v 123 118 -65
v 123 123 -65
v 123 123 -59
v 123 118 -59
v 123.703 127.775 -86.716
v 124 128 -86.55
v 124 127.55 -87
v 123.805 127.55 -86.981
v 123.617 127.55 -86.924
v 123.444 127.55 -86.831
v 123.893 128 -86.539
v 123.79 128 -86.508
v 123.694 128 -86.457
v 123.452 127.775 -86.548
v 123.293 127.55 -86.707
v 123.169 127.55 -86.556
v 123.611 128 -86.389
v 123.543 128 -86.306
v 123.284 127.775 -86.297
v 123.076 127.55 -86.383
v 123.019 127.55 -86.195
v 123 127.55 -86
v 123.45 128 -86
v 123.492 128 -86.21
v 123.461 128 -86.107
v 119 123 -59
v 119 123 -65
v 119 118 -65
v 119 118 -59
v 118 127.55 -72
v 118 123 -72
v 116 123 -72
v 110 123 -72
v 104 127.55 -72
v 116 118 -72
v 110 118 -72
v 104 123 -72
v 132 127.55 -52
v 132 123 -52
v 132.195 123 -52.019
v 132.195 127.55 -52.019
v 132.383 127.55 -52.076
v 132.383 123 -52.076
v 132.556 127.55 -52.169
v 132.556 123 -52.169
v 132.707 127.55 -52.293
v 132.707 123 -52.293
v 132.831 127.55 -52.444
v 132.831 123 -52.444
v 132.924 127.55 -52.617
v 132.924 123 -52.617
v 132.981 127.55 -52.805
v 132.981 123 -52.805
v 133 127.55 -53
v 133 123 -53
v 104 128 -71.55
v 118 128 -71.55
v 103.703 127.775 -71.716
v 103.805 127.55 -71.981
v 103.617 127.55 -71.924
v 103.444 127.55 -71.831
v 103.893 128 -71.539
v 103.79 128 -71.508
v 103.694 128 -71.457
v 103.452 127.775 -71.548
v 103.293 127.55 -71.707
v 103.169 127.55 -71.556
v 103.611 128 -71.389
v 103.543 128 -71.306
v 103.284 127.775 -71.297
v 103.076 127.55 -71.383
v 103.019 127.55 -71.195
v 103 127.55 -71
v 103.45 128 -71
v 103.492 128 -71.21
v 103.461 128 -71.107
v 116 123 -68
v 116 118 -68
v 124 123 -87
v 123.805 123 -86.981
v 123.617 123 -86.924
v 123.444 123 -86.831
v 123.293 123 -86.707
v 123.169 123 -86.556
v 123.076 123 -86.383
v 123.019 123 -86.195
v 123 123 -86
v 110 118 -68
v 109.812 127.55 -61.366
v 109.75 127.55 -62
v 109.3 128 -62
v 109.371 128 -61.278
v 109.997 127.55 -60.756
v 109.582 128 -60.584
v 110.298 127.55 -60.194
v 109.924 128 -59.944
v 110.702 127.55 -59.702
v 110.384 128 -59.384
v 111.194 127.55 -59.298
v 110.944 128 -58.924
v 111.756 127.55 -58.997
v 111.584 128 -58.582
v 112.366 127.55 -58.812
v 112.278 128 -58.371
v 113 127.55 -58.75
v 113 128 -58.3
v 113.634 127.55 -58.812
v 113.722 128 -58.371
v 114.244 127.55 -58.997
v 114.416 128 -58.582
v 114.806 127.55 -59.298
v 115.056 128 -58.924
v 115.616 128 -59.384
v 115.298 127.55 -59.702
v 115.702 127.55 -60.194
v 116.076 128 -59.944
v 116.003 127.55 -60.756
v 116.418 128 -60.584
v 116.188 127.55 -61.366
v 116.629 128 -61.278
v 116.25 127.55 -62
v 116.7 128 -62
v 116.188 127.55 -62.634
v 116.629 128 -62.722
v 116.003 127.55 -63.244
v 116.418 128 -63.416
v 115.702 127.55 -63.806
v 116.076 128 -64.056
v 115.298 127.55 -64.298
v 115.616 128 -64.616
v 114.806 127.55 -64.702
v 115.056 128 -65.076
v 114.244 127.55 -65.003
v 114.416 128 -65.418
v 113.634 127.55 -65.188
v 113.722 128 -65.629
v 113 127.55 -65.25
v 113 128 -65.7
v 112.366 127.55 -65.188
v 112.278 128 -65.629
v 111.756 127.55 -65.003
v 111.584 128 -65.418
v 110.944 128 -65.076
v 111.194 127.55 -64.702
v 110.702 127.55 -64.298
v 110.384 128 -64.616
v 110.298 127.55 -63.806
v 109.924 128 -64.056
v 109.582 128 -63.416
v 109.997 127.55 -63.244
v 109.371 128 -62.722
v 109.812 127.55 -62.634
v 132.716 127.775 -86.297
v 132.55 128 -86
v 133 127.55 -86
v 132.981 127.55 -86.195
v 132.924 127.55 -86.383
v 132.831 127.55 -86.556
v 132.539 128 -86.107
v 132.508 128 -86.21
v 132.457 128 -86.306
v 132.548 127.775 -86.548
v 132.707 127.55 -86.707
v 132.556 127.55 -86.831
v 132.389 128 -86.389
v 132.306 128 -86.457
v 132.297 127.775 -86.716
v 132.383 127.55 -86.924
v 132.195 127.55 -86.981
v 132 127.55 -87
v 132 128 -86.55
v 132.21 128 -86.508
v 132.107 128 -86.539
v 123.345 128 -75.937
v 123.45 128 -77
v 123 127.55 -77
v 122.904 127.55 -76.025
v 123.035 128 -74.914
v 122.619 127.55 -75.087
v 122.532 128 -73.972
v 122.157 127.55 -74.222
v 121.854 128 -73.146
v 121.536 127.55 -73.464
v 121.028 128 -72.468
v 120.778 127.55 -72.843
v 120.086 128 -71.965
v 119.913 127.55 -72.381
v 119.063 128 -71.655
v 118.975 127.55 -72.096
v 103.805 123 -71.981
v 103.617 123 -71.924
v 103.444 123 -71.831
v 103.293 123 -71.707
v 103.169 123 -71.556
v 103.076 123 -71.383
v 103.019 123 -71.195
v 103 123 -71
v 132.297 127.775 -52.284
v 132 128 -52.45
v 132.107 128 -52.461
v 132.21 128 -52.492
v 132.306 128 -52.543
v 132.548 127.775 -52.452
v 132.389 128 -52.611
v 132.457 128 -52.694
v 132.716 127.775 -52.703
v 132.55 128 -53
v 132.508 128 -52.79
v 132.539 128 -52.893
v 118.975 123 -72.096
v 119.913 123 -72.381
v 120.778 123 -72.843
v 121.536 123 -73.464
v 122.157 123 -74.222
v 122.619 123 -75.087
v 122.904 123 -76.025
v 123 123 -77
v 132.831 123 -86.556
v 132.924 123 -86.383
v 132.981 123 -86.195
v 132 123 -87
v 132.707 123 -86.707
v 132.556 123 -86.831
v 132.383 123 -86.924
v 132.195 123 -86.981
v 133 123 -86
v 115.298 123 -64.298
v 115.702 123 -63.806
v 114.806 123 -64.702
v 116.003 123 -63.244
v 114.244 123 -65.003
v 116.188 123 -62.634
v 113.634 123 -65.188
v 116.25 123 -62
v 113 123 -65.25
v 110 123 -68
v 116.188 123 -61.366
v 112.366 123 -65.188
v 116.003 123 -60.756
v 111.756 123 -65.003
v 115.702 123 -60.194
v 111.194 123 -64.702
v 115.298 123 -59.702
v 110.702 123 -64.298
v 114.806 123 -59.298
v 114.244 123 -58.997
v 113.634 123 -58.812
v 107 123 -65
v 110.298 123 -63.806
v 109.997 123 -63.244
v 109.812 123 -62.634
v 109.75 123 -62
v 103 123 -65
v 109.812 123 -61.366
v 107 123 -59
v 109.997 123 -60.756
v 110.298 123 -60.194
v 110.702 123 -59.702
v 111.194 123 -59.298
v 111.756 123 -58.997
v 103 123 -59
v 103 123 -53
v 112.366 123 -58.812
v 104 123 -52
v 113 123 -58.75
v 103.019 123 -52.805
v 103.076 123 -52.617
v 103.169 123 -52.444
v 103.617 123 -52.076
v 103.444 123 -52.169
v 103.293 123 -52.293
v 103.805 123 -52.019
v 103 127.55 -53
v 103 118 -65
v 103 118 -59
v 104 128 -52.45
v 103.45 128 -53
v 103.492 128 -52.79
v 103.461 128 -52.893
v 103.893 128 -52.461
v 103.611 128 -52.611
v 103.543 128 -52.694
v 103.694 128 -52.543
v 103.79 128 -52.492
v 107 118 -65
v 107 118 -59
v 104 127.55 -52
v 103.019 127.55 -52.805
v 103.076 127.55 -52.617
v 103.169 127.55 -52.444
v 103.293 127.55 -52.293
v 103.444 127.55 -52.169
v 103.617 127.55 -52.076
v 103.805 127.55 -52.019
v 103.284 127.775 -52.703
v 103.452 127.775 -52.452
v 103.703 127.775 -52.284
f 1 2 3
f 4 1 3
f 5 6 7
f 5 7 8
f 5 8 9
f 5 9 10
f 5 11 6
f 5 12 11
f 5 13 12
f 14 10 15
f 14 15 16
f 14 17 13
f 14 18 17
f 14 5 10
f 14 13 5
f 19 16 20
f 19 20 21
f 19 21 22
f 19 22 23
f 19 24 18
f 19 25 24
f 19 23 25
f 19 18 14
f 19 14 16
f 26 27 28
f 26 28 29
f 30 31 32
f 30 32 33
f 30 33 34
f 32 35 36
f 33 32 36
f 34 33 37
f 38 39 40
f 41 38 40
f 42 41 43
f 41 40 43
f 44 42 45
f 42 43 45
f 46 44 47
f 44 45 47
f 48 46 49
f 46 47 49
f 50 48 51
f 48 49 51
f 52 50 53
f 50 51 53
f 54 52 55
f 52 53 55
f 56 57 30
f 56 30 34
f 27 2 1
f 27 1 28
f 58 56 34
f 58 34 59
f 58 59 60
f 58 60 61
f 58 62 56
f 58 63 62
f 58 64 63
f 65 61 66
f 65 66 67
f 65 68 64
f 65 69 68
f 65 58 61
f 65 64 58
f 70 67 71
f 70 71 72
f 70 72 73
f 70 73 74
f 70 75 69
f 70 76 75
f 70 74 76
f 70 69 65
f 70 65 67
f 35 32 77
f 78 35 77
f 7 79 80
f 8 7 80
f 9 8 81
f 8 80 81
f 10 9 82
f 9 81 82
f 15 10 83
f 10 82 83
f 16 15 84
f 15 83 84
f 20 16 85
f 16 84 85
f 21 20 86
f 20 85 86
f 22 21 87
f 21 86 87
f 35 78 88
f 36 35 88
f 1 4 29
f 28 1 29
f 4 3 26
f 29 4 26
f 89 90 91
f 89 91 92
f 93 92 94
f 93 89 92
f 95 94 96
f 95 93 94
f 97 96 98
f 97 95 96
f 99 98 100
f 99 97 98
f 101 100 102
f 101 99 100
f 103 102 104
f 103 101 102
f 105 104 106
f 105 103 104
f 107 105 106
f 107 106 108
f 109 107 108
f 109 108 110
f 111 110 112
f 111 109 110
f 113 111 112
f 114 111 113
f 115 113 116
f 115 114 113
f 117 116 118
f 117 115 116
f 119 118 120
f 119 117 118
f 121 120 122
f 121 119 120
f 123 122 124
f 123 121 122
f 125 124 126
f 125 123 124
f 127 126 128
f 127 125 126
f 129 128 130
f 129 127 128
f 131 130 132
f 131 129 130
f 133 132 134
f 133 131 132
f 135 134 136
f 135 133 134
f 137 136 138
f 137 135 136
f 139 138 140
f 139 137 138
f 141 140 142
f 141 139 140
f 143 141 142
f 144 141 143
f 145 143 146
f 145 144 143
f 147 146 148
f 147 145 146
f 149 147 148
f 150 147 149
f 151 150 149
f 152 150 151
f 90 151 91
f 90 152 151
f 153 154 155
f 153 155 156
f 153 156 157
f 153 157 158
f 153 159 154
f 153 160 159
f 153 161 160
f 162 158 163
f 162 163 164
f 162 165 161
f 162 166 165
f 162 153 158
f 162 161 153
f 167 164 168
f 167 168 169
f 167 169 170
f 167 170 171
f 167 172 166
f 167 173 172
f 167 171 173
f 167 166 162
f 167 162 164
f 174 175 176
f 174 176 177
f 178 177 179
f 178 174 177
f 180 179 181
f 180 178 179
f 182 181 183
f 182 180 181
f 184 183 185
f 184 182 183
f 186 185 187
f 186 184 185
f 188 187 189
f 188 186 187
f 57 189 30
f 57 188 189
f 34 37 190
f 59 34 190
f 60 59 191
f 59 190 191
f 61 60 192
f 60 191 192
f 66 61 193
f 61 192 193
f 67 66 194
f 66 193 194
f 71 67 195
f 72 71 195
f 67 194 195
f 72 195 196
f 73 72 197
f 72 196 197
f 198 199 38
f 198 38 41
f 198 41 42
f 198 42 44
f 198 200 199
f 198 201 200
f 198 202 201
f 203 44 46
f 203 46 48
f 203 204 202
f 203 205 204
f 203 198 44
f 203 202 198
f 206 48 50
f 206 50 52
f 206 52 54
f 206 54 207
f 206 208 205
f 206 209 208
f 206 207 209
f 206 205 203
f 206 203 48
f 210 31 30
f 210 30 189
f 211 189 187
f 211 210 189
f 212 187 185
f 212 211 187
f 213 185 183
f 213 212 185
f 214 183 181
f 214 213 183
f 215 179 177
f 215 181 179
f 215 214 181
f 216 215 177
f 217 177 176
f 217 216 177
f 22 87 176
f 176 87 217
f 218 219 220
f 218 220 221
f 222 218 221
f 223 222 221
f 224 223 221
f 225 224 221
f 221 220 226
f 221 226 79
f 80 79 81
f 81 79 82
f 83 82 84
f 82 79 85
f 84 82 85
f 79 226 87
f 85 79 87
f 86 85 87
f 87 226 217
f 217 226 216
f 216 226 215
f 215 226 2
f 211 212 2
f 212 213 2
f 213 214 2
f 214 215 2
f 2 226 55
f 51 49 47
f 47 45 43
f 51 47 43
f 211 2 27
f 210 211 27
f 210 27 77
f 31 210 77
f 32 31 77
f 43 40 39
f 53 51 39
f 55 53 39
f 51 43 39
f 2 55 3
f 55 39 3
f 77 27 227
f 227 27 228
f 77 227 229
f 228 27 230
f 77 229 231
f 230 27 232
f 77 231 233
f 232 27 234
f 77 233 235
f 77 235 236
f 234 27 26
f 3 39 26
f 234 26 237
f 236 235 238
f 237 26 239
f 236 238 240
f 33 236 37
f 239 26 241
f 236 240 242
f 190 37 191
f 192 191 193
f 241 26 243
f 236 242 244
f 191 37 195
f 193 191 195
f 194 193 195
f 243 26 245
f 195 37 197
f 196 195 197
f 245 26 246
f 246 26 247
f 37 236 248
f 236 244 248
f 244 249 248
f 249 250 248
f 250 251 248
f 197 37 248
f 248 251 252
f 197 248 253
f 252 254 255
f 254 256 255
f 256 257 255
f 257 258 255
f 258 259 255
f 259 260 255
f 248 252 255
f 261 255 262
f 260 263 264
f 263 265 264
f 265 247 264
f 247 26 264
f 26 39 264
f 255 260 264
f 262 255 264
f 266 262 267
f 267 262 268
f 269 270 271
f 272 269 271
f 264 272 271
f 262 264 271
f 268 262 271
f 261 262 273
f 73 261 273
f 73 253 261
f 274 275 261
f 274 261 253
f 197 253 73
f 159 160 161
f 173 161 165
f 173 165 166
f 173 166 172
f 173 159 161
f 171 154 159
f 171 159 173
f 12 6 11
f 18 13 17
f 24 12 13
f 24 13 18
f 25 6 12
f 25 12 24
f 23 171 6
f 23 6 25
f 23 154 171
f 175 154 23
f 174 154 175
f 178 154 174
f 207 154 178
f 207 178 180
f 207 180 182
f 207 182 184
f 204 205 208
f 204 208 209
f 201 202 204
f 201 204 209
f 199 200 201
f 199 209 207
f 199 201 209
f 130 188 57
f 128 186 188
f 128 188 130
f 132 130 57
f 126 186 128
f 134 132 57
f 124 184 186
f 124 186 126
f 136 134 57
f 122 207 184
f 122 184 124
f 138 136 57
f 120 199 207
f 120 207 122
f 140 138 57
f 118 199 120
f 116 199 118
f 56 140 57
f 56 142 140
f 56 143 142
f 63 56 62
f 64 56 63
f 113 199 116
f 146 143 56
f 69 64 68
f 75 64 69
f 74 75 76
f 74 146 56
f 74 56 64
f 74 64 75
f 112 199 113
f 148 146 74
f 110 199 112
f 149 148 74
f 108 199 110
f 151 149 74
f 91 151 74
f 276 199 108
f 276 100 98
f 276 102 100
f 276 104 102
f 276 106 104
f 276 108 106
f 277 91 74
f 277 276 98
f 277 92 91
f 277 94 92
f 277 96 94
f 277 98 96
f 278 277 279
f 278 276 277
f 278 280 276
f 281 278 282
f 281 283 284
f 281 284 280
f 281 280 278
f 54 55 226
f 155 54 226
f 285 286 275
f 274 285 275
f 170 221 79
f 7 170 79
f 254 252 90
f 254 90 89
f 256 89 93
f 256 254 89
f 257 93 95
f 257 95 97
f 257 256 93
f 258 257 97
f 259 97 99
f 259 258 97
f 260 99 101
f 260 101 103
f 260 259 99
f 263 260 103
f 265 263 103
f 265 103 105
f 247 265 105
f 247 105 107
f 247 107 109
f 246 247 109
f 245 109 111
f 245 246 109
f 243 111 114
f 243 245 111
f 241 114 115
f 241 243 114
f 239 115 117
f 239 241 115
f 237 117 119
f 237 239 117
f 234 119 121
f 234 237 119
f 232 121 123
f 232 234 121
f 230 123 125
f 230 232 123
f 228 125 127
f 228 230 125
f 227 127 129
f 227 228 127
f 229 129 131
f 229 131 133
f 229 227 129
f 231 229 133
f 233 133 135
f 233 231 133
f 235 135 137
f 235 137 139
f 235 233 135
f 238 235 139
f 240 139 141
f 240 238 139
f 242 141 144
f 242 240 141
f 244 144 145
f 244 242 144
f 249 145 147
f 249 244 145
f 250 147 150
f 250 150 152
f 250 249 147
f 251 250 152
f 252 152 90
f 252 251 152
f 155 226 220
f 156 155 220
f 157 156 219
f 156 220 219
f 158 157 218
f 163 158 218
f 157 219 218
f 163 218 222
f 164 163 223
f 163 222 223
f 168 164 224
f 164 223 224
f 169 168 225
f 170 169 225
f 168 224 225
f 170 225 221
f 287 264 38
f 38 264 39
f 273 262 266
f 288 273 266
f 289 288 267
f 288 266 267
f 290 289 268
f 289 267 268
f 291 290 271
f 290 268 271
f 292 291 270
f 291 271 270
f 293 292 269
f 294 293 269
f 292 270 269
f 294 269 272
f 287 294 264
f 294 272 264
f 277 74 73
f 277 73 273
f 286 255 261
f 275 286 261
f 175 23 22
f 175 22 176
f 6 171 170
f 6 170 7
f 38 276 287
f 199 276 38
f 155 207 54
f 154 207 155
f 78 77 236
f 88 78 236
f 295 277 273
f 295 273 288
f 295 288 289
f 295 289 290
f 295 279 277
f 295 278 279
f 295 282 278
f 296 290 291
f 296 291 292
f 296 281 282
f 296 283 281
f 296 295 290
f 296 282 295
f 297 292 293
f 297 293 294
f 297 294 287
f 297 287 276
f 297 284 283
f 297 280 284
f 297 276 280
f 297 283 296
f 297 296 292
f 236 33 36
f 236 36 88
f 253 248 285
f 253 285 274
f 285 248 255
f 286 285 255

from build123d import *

# Parameters (mm, degrees)
SKETCH211_R   = 3.25
PAD055_DEPTH  = 5
SKETCH212_W   = 4
SKETCH212_H   = 6
SKETCH212_W_2 = 6
SKETCH212_H_2 = 4
PAD056_DEPTH  = 5
CHAMFER_SIZE  = 0.45


with BuildPart() as endstopper:
    # Sketch211 → Pad055 (new body)
    with BuildSketch(Plane.XZ):
        with BuildLine():
            Line((9, 10), (-19, 10))
            ThreePointArc((-19, 10), (-19.707107, 9.707107), (-20, 9))
            Line((-20, 9), (-20, -24))
            ThreePointArc((-20, -24), (-19.707107, -24.707107), (-19, -25))
            Line((-19, -25), (-11, -25))
            ThreePointArc((-11, -25), (-10.292893, -24.707107), (-10, -24))
            Line((-10, -24), (-10, -15))
            ThreePointArc((-5, -10), (-8.535534, -11.464466), (-10, -15))
            Line((-5, -10), (9, -10))
            ThreePointArc((9, -10), (9.707107, -9.707107), (10, -9))
            Line((10, 9), (10, -9))
            ThreePointArc((10, 9), (9.707107, 9.707107), (9, 10))
        make_face()
        Circle(SKETCH211_R, mode=Mode.SUBTRACT)
    extrude(amount=-PAD055_DEPTH)

    # Sketch212 → Pad056 (join)
    with BuildSketch(Plane.XZ):
        with Locations((-8, 0)):
            Rectangle(SKETCH212_W, SKETCH212_H)
        with Locations((8, 0)):
            Rectangle(SKETCH212_W, SKETCH212_H)
        with Locations((0, -8)):
            Rectangle(SKETCH212_W_2, SKETCH212_H_2)
    extrude(amount=PAD056_DEPTH)

    # Chamfer
    chamfer_edges = [endstopper.edges().sort_by_distance(p)[0] for p in [
        (9.707107, 5, 9.707107),
        (-5, 5, 10),
        (-19.707107, 5, 9.707107),
        (-20, 5, -7.5),
        (-19.707107, 5, -24.707107),
        (-15, 5, -25),
        (-10.292893, 5, -24.707107),
        (-10, 5, -19.5),
        (-8.535534, 5, -11.464466),
        (2, 5, -10),
        (9.707107, 5, -9.707107),
        (10, 5, 0),
        (-3.25, 5, 0),
    ]]
    chamfer(chamfer_edges, length=CHAMFER_SIZE)


with BuildPart() as endstopper_1:
    # Body022046 placement: moved
    add(endstopper.part.moved(Location((-113, 123, -62))))


with BuildPart() as endstopper_m:
    # Part__Mirroring: instance of EndStopper
    add(endstopper_1.part.mirror(Plane(origin=(0, 0, 0), x_dir=(0, -1, 0), z_dir=(1, 0, 0))))


solid = endstopper_m.part
